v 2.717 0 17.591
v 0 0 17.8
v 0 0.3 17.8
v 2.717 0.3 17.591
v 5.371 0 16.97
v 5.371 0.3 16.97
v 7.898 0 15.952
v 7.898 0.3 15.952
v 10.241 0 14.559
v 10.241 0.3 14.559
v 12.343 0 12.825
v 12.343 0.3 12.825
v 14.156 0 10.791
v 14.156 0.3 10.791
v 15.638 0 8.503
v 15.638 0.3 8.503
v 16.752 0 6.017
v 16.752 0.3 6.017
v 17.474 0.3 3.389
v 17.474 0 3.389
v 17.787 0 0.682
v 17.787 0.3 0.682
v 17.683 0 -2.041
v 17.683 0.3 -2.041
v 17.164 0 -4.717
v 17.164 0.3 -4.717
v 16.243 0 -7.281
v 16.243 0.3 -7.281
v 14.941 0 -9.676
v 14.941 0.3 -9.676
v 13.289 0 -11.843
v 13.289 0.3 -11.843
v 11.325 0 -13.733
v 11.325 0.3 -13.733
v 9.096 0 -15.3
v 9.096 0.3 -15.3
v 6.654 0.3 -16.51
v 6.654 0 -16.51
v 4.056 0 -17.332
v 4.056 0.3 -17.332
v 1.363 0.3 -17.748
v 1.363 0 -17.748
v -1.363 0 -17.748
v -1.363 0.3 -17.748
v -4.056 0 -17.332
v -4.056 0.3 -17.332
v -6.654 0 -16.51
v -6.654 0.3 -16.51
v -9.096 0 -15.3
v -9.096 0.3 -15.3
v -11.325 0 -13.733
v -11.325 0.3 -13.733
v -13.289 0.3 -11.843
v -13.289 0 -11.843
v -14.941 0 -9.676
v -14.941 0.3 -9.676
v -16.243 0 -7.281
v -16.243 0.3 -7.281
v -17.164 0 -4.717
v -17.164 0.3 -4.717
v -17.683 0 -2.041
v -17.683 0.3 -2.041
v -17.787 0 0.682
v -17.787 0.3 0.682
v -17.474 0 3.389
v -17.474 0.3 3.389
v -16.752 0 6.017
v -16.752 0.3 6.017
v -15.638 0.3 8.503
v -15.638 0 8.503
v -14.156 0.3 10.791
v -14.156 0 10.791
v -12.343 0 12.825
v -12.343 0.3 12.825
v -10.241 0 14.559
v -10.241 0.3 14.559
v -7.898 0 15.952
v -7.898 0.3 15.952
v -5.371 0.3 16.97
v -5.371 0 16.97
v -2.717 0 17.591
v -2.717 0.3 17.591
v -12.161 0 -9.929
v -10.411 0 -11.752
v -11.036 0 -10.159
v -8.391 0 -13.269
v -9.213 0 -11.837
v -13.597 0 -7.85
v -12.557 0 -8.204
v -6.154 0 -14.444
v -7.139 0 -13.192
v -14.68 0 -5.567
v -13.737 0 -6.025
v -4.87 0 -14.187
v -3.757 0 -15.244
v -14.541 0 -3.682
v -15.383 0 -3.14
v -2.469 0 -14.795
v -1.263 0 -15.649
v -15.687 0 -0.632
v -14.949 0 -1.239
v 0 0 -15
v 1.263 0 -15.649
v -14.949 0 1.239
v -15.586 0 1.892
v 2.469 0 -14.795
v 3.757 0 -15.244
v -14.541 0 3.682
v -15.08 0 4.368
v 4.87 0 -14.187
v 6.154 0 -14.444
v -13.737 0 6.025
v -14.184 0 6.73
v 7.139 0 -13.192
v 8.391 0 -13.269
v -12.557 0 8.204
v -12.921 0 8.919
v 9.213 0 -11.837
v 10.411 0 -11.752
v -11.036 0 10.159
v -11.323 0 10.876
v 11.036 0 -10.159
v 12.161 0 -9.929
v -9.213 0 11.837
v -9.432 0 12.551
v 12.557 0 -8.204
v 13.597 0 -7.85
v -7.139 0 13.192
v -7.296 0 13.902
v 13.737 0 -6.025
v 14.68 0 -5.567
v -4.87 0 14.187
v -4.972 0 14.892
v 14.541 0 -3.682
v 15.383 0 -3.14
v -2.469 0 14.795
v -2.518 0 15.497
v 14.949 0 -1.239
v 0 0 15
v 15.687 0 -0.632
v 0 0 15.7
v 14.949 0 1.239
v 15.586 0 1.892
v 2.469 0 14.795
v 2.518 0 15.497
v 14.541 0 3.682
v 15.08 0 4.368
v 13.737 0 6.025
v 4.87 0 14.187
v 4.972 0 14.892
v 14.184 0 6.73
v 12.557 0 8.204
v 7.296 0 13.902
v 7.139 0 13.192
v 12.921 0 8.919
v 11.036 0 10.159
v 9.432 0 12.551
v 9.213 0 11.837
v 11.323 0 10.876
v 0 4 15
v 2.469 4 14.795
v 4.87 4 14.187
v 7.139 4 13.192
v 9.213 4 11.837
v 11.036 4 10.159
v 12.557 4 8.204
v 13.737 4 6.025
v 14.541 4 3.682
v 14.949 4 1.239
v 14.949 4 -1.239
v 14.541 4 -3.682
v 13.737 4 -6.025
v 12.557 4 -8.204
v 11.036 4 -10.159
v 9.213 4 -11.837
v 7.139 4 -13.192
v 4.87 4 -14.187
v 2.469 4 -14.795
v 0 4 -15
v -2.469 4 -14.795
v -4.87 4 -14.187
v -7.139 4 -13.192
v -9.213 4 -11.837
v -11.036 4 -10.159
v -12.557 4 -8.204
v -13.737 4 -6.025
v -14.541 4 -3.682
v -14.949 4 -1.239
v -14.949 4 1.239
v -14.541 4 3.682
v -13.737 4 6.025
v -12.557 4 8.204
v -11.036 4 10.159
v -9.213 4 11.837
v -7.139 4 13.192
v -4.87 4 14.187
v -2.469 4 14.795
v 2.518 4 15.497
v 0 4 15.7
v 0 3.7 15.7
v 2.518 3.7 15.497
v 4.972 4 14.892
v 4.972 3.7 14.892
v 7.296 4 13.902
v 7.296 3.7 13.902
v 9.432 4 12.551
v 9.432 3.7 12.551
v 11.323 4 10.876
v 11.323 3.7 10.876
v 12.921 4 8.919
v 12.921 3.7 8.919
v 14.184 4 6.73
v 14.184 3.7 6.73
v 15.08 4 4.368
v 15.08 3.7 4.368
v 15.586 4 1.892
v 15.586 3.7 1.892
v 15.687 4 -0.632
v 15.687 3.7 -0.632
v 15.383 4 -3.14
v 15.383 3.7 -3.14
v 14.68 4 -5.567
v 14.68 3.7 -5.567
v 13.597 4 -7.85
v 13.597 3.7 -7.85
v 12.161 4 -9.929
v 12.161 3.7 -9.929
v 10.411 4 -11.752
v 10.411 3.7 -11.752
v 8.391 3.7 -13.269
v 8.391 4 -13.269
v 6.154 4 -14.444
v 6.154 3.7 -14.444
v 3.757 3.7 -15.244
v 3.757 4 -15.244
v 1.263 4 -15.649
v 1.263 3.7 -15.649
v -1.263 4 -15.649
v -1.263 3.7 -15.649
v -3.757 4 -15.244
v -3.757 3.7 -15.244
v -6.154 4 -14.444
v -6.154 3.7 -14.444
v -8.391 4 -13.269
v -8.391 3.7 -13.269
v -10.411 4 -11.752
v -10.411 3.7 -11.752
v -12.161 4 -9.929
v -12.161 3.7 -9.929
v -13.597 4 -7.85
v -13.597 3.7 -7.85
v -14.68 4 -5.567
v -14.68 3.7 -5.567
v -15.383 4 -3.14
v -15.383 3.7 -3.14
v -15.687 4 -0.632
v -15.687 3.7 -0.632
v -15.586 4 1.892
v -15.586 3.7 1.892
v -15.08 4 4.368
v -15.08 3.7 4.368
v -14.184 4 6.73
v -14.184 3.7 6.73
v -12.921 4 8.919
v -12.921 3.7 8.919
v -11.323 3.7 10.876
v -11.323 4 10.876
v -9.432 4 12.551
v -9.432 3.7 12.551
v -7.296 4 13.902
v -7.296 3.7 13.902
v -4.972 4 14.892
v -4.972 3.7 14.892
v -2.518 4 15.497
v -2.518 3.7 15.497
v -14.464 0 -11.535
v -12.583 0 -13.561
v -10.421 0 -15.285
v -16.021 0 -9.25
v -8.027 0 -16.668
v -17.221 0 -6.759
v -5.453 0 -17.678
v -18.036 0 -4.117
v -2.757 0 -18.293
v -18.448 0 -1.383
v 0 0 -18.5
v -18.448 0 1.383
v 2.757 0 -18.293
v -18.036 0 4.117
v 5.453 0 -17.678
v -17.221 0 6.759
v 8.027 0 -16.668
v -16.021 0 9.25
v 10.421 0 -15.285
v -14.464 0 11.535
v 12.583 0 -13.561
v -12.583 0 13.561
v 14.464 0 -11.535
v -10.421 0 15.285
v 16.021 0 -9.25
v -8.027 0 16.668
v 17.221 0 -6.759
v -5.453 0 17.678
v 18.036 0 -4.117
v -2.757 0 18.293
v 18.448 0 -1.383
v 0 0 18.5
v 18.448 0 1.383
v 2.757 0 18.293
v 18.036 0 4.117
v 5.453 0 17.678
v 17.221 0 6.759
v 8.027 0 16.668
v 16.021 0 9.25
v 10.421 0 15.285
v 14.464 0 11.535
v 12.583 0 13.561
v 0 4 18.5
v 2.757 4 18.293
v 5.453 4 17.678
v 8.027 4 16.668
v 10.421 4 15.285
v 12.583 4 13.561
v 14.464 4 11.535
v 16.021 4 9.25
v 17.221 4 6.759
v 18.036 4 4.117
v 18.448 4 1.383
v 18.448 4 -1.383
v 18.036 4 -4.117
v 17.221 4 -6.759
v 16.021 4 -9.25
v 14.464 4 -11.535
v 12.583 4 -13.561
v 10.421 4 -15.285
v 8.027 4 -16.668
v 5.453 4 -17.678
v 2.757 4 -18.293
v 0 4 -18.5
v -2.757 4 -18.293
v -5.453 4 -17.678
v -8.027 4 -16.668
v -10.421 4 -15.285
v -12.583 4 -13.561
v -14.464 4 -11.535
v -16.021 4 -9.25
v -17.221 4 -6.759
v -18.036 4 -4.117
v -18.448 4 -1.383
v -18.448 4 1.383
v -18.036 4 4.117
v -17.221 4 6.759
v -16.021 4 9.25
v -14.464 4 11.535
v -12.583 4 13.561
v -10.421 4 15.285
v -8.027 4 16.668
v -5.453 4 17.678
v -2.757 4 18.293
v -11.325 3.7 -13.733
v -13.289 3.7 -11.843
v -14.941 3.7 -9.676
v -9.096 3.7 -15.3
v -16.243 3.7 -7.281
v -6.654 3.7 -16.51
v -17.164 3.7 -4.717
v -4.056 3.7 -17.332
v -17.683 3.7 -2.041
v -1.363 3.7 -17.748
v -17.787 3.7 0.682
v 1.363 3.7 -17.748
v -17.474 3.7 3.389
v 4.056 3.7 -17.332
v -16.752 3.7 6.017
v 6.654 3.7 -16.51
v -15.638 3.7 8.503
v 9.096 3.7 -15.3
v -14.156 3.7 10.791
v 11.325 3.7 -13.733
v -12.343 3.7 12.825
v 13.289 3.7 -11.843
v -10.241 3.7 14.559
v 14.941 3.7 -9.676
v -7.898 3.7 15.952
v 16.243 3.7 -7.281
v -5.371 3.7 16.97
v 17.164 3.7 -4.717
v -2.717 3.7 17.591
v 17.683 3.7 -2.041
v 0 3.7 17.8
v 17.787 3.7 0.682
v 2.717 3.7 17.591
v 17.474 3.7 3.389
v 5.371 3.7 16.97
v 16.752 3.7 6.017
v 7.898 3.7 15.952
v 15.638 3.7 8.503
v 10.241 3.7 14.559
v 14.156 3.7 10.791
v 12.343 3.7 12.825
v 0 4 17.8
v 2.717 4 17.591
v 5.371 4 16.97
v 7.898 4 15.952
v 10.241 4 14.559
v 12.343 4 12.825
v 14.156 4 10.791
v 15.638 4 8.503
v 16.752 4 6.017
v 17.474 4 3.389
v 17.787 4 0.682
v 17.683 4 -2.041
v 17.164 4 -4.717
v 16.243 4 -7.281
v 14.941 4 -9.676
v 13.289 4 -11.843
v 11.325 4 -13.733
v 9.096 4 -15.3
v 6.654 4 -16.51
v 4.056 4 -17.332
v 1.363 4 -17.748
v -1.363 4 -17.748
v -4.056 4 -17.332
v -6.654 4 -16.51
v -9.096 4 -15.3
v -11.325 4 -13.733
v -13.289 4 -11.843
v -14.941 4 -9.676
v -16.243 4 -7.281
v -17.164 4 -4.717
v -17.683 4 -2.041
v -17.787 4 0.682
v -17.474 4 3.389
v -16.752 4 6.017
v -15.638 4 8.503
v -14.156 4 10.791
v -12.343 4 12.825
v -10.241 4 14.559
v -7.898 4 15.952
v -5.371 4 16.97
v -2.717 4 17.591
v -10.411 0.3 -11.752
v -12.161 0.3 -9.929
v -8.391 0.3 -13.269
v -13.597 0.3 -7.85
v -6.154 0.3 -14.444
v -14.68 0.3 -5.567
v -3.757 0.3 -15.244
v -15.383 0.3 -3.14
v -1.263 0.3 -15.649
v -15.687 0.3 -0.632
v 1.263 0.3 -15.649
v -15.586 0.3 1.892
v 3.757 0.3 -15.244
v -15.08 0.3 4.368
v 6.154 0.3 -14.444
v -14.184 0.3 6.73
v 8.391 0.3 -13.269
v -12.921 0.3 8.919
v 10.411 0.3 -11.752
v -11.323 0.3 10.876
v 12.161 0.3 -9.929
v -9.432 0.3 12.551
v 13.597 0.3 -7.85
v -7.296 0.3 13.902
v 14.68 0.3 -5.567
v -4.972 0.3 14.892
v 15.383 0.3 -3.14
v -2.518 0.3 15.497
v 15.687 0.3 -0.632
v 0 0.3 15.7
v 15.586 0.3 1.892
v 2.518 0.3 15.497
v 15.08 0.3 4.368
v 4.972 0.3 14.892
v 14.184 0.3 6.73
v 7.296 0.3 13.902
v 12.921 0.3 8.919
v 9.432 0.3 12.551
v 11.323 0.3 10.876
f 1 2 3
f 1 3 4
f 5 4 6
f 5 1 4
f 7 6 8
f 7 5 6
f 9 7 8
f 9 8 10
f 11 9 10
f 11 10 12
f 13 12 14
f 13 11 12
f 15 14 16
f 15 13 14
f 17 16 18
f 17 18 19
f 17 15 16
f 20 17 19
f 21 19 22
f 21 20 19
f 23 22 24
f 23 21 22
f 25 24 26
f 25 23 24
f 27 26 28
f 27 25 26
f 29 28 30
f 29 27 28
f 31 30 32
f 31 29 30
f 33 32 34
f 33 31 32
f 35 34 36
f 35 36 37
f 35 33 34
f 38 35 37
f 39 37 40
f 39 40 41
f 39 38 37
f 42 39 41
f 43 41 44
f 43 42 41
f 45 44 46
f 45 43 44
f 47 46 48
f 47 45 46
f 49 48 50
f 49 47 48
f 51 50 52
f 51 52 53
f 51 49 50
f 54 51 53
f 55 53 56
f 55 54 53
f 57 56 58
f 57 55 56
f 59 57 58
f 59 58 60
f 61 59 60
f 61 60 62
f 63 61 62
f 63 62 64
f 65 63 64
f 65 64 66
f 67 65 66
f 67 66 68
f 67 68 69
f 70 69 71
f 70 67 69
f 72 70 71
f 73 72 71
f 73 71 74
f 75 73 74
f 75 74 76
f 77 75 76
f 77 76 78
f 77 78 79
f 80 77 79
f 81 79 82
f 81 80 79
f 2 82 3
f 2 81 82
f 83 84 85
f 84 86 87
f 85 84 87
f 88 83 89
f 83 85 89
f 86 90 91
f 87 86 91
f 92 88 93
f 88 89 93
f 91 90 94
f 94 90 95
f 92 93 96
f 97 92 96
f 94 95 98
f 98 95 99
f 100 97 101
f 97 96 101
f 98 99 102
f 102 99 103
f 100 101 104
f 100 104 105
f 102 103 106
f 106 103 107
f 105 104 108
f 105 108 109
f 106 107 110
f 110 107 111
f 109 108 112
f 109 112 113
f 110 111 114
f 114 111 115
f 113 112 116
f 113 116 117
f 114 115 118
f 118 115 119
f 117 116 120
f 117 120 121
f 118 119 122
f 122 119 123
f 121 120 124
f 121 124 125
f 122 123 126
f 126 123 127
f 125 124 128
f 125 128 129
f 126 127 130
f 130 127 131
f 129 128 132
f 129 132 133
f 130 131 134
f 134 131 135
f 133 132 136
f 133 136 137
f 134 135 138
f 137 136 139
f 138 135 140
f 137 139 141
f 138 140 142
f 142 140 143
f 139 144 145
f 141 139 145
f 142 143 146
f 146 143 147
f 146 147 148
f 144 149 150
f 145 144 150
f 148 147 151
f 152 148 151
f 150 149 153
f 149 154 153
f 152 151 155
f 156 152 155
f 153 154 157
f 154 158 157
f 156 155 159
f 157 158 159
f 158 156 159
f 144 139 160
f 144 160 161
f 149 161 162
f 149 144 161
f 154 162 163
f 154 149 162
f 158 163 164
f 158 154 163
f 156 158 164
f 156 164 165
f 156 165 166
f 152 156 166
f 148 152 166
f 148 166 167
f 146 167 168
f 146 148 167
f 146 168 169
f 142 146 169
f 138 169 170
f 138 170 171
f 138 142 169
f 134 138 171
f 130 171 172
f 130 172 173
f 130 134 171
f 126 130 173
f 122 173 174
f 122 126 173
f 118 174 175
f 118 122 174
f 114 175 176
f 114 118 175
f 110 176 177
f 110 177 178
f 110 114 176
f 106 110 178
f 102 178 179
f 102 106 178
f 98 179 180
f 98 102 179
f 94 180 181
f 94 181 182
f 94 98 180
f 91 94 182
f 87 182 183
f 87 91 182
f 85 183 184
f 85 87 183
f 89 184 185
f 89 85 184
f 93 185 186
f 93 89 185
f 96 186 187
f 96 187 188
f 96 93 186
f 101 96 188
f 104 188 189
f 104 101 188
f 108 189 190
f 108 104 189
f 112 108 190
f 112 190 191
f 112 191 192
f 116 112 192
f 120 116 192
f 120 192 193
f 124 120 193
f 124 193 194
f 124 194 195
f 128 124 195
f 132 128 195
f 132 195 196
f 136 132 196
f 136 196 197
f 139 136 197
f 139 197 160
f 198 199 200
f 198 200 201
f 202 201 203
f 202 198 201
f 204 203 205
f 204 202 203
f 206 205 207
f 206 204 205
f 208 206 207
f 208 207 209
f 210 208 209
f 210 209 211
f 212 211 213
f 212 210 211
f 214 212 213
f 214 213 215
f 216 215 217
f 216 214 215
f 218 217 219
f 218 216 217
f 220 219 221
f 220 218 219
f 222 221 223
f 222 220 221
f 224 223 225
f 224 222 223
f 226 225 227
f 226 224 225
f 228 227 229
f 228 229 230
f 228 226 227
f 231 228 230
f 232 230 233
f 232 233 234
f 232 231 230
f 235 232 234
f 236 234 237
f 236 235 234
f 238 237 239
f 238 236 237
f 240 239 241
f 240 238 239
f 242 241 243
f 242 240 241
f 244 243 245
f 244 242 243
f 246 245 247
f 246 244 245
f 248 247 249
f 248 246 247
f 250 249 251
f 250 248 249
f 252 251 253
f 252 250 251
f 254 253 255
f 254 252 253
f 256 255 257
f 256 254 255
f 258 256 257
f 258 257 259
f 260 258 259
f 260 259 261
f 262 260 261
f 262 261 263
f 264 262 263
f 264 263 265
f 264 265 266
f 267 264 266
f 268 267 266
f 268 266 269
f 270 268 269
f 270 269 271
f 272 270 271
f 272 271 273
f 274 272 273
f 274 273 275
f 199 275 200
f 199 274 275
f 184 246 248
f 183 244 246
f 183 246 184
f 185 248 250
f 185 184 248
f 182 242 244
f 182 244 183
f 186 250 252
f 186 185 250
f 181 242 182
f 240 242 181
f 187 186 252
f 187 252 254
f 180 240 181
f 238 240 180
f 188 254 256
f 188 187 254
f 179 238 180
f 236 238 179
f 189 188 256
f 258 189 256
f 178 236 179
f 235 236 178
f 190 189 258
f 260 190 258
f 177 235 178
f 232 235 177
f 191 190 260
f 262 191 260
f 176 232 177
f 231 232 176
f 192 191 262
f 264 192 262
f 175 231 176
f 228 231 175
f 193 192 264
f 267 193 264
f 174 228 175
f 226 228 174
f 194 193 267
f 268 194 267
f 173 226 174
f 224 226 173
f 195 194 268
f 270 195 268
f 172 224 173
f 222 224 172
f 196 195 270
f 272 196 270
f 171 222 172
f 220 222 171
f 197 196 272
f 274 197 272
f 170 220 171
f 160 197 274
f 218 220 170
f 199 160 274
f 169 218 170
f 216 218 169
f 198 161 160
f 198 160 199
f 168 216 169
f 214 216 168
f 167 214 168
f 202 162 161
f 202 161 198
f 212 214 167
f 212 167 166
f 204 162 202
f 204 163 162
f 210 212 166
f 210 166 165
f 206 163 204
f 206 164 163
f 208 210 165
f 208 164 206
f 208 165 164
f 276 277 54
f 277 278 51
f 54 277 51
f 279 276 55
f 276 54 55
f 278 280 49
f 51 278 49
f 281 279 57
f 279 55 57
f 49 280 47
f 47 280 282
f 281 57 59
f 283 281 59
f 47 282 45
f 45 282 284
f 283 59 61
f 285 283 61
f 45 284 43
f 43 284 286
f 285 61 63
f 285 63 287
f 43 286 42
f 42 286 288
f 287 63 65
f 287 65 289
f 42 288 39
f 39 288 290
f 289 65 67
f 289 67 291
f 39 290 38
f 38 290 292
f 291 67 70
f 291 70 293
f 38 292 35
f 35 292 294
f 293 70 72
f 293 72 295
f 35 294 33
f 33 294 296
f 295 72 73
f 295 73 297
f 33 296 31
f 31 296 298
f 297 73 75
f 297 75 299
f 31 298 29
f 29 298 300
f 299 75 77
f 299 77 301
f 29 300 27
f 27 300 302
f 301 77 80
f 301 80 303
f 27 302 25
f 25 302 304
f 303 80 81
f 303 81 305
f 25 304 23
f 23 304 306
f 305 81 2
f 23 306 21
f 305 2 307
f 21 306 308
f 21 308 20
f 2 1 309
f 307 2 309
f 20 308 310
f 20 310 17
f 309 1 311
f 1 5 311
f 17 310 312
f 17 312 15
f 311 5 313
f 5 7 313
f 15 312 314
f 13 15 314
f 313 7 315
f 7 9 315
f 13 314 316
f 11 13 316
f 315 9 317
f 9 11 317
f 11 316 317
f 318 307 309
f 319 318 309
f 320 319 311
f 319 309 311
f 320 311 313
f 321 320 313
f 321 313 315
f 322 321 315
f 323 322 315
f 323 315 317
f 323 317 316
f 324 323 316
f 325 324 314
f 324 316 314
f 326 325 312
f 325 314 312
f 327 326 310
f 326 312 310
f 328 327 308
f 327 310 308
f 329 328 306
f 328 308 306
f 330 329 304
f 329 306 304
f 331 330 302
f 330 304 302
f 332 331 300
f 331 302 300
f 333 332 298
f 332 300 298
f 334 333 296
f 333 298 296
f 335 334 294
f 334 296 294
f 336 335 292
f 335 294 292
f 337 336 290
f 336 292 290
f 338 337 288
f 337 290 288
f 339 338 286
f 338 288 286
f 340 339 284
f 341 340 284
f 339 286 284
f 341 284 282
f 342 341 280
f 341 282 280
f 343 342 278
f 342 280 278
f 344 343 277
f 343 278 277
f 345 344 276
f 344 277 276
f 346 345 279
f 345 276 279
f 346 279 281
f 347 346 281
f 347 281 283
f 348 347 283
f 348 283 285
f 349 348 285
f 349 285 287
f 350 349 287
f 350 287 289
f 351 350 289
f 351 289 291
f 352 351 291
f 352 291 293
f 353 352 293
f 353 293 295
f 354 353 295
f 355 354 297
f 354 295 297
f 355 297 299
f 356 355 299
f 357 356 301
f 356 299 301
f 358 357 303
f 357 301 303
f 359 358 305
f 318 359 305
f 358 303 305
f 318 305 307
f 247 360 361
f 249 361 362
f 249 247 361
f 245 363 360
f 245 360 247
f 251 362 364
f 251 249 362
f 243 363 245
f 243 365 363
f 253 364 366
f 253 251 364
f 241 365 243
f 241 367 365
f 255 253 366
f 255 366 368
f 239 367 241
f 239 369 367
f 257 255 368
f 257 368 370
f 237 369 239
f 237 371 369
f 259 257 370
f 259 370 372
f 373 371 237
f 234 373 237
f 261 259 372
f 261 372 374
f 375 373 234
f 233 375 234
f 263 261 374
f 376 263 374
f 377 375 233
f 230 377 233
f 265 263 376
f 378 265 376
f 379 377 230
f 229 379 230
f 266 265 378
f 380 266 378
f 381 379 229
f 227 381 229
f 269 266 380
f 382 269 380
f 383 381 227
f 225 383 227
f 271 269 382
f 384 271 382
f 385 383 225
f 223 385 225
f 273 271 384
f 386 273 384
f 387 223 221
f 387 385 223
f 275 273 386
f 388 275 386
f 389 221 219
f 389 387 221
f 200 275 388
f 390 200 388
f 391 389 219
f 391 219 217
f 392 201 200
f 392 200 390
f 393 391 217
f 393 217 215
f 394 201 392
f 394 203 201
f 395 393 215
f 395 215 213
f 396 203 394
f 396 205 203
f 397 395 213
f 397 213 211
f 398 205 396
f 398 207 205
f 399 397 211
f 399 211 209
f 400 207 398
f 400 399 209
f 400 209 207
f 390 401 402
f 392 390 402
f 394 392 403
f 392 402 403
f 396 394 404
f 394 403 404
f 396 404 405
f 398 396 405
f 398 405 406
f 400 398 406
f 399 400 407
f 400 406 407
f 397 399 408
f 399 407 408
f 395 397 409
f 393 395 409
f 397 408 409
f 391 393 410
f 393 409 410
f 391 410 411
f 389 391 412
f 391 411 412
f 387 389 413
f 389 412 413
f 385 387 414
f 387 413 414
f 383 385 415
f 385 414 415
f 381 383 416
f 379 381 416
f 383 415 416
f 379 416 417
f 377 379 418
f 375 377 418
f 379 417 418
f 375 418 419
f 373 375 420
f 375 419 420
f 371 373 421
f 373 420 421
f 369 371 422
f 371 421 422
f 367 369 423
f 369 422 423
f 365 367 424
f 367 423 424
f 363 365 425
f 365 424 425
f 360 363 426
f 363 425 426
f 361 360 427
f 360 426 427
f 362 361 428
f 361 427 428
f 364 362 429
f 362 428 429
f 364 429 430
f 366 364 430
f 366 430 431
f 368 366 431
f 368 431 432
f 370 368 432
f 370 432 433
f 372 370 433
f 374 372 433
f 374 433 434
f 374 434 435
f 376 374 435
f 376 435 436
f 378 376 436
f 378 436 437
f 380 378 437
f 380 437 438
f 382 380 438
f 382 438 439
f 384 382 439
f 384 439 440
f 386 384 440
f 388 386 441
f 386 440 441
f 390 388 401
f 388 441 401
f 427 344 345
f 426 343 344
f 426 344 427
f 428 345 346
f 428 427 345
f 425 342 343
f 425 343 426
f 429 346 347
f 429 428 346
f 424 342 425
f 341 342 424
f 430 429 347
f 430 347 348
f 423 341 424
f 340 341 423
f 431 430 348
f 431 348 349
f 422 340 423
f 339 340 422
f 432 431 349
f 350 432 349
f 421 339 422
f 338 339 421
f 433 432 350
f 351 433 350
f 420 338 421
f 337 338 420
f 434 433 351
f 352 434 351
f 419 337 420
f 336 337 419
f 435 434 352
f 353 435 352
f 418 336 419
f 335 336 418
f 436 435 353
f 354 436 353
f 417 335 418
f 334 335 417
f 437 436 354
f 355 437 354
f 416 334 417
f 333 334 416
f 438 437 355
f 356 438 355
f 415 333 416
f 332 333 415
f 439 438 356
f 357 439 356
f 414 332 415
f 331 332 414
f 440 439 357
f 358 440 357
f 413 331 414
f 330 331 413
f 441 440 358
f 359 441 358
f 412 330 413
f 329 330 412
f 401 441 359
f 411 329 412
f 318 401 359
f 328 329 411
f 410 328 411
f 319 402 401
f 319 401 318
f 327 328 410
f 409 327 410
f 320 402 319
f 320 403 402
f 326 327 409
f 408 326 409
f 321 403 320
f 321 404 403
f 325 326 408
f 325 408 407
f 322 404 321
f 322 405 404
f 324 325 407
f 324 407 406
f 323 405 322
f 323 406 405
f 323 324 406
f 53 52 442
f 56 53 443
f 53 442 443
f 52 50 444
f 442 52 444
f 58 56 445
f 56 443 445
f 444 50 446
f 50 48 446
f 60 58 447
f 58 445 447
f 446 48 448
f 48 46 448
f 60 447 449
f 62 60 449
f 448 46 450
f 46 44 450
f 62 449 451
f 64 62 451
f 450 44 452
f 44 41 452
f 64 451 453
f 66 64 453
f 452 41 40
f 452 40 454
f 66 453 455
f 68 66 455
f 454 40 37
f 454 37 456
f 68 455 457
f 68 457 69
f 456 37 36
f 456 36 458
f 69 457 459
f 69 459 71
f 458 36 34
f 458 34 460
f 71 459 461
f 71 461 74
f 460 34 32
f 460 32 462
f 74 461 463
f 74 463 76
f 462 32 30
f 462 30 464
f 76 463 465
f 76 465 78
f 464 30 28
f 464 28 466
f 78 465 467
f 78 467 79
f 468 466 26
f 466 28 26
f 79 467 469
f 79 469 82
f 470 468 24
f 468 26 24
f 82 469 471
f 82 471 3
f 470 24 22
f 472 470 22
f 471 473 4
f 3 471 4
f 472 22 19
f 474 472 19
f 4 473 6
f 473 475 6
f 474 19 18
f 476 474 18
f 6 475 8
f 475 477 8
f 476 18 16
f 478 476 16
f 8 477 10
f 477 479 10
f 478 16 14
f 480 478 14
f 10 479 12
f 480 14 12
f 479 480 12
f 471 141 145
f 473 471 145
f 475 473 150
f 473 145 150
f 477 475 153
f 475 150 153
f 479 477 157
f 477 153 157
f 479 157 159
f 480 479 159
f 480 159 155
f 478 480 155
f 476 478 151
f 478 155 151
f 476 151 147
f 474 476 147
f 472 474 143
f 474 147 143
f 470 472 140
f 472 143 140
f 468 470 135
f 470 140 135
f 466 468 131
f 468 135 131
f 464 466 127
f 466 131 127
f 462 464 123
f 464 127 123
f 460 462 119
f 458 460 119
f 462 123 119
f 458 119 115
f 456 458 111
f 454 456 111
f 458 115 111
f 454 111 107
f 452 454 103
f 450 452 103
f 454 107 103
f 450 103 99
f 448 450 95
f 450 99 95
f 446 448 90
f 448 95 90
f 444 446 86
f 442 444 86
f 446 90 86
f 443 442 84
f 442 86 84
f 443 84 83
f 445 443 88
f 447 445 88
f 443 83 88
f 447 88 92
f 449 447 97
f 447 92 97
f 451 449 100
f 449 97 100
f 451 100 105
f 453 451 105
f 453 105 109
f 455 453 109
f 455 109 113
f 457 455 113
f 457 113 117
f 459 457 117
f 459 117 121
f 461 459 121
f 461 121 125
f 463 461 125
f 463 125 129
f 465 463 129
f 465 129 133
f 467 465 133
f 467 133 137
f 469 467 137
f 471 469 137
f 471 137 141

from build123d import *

# Parameters (mm, degrees)
SKETCH_1_R          = 18.5
SKETCH_1_R_2        = 15
EXTRUDE_1_DEPTH     = 4
SKETCH_2_R          = 17.8
SKETCH_2_R_2        = 15.7
CUT_EXTRUDE_1_DEPTH = 0.3


with BuildPart() as part:
    # 草图1 → 凸台-拉伸1 (new body)
    with BuildSketch(Plane(origin=(0, 0, 0), x_dir=(1, 0, 0), z_dir=(0, 1, 0))):
        with Locations(Location((0, 0, 0), (0, 0, 270))):
            Circle(SKETCH_1_R)
        with Locations(Location((0, 0, 0), (0, 0, 270))):
            Circle(SKETCH_1_R_2, mode=Mode.SUBTRACT)
    extrude(amount=EXTRUDE_1_DEPTH)

    # 草图2 → 切除-拉伸1 (cut)
    with BuildSketch(Plane(origin=(0, 4, 0), x_dir=(1, 0, 0), z_dir=(0, 1, 0))):
        with Locations(Location((0, 0, 0), (0, 0, 270))):
            Circle(SKETCH_2_R)
        with Locations(Location((0, 0, 0), (0, 0, 270))):
            Circle(SKETCH_2_R_2, mode=Mode.SUBTRACT)
    cut_extrude_1 = extrude(amount=-CUT_EXTRUDE_1_DEPTH, mode=Mode.SUBTRACT)

    # 镜向1: 切除-拉伸1 across plane
    add(cut_extrude_1.mirror(Plane.ZX.offset(2)), mode=Mode.SUBTRACT)


solid = part.part
